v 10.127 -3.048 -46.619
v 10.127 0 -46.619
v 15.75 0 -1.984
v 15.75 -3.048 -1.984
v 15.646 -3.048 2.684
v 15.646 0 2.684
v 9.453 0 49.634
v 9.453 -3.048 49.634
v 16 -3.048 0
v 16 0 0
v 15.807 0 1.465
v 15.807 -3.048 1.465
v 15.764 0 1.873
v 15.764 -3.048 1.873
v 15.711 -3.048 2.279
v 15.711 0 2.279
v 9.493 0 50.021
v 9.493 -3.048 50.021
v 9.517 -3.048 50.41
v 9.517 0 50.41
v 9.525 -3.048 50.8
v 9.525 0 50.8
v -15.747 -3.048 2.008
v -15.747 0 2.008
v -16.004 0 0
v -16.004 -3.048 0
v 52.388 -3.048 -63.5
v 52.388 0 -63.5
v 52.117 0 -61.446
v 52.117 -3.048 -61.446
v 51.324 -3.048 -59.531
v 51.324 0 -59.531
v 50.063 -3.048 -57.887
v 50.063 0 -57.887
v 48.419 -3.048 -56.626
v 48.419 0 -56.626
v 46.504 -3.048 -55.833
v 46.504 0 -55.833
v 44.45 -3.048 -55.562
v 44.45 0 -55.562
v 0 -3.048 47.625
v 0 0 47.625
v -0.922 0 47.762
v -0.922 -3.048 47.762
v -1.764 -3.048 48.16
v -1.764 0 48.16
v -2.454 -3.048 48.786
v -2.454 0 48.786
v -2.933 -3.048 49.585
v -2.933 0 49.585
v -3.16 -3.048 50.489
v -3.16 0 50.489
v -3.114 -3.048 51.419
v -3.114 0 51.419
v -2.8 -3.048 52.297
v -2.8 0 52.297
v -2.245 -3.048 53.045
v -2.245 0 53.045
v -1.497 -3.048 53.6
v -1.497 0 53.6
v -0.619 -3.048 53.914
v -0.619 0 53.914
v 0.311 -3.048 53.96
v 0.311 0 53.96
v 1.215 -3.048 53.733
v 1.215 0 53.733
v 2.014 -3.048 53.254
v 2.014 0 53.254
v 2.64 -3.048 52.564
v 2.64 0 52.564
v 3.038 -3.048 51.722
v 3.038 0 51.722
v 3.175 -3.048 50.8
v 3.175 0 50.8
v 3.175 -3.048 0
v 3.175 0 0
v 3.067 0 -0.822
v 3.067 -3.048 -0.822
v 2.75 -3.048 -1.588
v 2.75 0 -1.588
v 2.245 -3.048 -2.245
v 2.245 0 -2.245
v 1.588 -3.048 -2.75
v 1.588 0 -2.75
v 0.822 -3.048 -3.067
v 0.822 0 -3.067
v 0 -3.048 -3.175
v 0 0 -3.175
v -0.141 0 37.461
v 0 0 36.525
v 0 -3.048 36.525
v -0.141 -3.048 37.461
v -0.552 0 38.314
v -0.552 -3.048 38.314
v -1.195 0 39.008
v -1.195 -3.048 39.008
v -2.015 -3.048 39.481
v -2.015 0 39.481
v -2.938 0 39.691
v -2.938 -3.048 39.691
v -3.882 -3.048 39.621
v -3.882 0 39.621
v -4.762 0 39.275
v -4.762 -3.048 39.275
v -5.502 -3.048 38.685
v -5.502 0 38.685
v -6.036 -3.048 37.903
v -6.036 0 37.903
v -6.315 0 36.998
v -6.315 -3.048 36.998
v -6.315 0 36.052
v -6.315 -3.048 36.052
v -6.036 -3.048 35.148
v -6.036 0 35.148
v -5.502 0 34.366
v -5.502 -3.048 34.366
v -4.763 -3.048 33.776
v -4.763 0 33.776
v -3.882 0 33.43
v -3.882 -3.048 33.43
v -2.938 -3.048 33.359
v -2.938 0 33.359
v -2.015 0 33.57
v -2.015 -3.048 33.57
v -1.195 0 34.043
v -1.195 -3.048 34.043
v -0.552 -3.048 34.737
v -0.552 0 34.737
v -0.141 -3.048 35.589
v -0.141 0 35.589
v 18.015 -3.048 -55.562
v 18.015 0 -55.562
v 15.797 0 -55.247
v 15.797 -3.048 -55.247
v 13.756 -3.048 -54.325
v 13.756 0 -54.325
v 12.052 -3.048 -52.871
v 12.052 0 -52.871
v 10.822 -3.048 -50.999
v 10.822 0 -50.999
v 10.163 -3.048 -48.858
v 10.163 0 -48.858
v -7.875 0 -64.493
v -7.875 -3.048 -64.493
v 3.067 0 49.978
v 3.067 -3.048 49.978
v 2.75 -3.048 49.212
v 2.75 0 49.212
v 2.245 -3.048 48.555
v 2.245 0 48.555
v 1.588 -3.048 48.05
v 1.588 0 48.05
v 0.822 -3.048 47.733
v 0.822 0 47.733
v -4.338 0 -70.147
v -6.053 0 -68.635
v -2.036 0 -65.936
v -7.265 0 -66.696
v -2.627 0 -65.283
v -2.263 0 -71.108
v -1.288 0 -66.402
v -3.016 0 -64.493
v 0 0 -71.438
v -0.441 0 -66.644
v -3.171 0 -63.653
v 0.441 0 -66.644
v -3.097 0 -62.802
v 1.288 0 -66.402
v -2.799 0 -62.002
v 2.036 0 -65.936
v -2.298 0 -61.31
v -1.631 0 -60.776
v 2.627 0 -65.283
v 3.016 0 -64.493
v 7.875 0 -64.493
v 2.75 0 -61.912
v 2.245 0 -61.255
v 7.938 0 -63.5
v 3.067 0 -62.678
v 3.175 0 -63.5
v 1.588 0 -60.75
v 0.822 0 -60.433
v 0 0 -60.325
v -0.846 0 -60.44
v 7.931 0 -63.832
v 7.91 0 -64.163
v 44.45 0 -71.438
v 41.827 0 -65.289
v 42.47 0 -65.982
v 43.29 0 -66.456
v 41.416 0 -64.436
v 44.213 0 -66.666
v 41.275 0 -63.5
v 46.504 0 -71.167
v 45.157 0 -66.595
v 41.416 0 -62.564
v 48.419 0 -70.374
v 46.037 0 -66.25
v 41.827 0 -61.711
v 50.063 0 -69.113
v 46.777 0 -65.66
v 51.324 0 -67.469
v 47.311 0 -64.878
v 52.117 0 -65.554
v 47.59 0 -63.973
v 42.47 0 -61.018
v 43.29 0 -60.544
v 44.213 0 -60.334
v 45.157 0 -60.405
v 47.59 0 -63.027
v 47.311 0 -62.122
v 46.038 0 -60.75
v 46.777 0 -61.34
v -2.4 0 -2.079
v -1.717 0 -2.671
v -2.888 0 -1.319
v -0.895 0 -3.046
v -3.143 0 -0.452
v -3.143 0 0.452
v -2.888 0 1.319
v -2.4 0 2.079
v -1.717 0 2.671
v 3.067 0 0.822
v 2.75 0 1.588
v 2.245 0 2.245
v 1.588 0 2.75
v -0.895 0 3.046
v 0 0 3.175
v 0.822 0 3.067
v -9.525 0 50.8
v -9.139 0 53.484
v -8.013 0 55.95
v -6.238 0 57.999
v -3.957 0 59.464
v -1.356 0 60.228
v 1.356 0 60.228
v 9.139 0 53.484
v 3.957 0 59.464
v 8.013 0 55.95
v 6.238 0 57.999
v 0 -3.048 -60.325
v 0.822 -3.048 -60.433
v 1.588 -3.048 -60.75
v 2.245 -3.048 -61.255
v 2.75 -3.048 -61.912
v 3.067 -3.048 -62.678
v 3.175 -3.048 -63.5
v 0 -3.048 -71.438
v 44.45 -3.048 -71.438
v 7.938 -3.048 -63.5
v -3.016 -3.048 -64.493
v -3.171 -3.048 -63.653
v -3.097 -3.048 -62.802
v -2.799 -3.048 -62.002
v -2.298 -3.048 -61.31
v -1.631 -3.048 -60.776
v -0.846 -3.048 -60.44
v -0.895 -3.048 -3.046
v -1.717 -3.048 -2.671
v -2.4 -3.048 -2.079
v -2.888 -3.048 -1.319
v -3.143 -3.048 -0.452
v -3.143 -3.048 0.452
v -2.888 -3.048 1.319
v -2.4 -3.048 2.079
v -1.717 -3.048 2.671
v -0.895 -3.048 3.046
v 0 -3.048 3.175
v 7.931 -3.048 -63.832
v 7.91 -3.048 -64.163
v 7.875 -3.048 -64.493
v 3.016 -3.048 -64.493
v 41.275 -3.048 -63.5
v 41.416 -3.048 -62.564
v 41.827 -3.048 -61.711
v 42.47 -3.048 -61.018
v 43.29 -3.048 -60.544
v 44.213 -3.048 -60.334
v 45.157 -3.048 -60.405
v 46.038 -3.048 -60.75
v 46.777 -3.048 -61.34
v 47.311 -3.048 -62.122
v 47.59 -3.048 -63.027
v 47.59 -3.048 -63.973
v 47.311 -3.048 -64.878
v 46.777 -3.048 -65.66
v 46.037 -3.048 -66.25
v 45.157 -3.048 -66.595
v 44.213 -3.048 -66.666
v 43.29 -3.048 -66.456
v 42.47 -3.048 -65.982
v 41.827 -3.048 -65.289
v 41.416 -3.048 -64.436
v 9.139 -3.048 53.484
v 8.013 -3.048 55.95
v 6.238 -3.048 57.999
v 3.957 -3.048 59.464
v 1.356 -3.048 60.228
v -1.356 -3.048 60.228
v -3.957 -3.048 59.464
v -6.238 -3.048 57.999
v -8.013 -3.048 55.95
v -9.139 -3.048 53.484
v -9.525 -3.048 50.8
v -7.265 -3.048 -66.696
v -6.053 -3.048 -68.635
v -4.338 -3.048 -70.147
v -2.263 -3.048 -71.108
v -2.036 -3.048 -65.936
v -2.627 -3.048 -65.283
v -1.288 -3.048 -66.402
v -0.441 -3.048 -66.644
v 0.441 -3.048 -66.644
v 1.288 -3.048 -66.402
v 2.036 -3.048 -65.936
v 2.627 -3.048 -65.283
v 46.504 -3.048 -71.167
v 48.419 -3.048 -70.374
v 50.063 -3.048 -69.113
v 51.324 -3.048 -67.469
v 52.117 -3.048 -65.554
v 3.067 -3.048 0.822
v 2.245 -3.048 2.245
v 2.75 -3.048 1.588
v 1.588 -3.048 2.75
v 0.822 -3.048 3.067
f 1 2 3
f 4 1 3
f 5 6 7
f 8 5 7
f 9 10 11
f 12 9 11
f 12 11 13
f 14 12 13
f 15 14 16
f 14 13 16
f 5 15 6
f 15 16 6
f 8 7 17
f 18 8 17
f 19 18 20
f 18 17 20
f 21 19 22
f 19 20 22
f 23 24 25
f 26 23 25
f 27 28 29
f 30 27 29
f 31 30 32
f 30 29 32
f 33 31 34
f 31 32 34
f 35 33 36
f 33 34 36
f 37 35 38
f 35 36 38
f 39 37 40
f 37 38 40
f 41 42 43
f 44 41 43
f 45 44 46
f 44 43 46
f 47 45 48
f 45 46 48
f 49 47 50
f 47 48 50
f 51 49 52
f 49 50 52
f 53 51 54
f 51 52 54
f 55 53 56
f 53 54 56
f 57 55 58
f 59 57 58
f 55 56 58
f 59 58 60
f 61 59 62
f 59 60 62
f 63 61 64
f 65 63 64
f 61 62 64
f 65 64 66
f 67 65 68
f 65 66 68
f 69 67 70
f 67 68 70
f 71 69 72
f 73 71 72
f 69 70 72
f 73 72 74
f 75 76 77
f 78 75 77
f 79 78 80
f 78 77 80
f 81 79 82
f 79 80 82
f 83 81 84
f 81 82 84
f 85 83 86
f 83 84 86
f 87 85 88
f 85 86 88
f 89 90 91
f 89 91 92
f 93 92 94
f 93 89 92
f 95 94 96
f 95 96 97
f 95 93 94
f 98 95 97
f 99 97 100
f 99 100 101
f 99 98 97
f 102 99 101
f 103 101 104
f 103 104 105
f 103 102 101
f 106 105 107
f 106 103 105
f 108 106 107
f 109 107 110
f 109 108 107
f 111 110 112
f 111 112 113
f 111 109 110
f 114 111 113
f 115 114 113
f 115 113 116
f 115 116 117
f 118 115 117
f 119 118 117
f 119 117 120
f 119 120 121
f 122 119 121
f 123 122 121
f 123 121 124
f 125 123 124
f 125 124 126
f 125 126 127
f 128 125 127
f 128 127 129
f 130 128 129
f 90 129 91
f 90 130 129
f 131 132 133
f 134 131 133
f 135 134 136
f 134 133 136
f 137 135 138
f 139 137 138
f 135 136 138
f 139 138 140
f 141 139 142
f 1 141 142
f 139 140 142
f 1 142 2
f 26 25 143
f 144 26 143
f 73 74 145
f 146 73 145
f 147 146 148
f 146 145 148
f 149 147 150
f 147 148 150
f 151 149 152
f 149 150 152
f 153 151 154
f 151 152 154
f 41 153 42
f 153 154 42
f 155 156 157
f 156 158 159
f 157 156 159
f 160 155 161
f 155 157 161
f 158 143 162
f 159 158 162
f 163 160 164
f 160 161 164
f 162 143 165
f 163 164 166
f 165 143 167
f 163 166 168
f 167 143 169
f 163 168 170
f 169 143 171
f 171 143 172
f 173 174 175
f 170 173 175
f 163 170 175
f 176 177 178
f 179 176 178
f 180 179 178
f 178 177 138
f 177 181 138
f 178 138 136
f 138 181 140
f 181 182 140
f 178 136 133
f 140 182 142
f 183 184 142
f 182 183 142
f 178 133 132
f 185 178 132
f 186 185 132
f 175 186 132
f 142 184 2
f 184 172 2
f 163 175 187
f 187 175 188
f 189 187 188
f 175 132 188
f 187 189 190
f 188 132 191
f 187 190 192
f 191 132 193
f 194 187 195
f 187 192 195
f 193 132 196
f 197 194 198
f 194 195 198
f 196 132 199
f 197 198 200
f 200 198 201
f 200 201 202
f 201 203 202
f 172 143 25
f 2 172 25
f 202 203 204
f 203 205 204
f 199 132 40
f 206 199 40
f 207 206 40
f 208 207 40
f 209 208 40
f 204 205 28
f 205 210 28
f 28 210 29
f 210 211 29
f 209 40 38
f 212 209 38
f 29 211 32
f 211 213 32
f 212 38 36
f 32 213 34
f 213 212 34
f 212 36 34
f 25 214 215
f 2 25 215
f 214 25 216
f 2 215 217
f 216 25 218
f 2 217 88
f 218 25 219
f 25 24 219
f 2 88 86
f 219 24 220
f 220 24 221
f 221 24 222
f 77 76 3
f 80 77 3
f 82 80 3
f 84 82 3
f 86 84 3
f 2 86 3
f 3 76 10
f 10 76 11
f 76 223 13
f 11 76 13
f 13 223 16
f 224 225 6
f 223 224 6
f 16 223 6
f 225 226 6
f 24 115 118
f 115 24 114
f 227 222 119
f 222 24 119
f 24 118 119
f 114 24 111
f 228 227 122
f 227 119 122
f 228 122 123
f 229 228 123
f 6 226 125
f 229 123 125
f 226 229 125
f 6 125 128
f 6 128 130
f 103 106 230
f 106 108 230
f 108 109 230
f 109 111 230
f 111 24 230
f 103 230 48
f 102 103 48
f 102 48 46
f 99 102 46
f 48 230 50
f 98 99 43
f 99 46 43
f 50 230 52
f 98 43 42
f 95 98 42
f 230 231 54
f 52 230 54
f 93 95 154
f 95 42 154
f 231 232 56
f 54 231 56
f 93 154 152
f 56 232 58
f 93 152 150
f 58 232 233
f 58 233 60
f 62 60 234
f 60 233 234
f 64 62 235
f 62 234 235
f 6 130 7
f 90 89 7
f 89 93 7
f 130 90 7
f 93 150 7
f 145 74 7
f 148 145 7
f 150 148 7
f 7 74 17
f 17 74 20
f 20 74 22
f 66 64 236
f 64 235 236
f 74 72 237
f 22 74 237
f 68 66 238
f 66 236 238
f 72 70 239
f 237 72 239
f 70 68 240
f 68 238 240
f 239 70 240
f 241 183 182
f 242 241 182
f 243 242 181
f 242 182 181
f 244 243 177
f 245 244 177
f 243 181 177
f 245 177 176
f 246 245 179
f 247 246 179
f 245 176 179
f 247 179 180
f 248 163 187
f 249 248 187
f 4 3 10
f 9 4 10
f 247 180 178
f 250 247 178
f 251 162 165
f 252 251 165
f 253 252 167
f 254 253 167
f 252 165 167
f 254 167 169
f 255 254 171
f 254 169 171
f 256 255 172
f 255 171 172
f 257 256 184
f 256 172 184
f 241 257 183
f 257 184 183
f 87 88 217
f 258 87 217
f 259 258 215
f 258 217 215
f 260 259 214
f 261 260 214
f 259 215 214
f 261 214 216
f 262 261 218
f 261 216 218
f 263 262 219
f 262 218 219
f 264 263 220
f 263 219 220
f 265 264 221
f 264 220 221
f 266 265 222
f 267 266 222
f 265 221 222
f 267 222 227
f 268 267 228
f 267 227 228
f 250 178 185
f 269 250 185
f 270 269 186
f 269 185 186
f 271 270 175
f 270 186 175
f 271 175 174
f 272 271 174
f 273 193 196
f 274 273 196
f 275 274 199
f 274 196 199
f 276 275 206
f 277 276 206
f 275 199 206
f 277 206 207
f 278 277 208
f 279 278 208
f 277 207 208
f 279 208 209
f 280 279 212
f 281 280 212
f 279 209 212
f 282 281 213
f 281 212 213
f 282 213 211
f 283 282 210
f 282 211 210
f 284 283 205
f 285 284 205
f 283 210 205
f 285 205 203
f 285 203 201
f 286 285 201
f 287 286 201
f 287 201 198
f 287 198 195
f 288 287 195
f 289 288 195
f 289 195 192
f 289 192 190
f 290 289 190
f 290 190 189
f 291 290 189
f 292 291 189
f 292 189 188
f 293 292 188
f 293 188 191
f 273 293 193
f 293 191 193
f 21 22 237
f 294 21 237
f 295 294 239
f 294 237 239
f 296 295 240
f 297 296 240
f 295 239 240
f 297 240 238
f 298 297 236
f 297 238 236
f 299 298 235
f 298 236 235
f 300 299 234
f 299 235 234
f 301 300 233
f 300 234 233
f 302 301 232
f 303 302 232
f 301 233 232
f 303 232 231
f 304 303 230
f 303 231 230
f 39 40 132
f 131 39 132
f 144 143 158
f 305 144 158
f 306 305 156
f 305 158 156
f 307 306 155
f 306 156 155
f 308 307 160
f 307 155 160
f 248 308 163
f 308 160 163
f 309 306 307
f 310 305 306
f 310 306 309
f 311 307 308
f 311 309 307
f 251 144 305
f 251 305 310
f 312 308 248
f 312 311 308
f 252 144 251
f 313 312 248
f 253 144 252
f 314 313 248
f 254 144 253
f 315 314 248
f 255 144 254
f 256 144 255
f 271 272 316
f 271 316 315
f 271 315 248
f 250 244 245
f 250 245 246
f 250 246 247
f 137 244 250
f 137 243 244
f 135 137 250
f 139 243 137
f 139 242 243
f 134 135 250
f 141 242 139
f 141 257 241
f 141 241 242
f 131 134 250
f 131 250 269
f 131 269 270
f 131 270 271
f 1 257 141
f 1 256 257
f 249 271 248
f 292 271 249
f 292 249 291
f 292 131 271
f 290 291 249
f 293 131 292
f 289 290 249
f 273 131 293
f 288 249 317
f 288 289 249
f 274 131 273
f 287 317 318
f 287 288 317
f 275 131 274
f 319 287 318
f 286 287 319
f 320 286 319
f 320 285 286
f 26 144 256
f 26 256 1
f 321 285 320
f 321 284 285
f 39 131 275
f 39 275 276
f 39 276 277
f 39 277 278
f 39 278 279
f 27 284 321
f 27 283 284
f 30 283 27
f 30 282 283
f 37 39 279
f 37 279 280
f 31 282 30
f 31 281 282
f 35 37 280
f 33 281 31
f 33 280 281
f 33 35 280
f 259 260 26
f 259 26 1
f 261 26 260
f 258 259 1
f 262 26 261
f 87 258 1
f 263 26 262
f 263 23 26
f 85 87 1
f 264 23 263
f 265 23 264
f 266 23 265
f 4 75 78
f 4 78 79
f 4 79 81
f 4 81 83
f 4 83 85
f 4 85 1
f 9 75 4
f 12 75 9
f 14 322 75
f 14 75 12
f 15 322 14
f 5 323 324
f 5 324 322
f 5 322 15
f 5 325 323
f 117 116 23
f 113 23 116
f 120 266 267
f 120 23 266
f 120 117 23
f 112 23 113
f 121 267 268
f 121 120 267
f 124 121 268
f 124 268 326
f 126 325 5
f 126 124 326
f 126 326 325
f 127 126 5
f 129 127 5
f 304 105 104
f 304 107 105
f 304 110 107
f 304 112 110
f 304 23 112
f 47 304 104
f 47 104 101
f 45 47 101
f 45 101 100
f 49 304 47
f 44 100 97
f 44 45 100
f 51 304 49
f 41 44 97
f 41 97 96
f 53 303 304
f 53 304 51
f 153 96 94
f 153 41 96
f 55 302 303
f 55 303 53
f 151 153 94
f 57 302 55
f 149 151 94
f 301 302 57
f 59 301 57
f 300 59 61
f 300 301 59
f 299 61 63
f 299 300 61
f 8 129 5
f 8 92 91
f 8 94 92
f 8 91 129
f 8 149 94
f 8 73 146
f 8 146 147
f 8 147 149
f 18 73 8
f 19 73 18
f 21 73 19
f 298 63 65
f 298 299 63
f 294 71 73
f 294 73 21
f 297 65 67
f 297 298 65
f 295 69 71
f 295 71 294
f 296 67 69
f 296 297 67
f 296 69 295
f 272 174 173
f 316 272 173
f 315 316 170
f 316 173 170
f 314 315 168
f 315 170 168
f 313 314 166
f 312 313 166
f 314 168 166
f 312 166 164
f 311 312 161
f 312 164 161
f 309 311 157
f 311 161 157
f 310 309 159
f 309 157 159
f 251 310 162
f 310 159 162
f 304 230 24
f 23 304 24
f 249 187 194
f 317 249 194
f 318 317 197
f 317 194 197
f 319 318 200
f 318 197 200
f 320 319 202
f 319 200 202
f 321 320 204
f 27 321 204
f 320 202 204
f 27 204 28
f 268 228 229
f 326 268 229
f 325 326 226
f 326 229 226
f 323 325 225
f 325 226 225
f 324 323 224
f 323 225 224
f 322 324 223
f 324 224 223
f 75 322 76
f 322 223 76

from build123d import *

# Parameters (mm, degrees)
F0_R     = 3.175
F1_DEPTH = 3.048


with BuildPart() as f1:
    # F0 (on Front) → F1 (new body)
    with BuildSketch(Plane.XZ):
        with BuildLine():
            ThreePointArc((-9.525, 50.8), (-6.7351920908, 44.0648079092), (0, 41.275))
            ThreePointArc((0, 41.275), (6.3093081085, 43.6642970779), (9.4533014816, 49.6335026369))
            ThreePointArc((9.4533014816, 49.6335026369), (9.5070584728, 50.2156506234), (9.525, 50.8))
            ThreePointArc((9.525, 50.8), (0, 60.325), (-9.525, 50.8))
        make_face()
        with BuildLine():
            ThreePointArc((3.175, 50.8), (2.2450640303, 48.5549359697), (0, 47.625))
            ThreePointArc((0, 47.625), (-2.2450640303, 53.0450640303), (3.175, 50.8))
        make_face(mode=Mode.SUBTRACT)
        with BuildLine():
            ThreePointArc((9.4533014816, 49.6335026369), (6.3093081085, 43.6642970779), (0, 41.275))
            Line((0, 41.275), (0, 36.5252))
            Line((0, 36.5252), (0, 15.875))
            ThreePointArc((0, 15.875), (10.2323349377, 12.1373368876), (15.646399532, 2.6843633667))
            Line((15.646399532, 2.6843633667), (9.4533014816, 49.6335026369))
        make_face()
        with BuildLine():
            Line((0, 36.5252), (0, 41.275))
            ThreePointArc((0, 41.275), (-6.7351920908, 44.0648079092), (-9.525, 50.8))
            Line((-9.525, 50.8), (-15.7474569171, 2.008289233))
            ThreePointArc((-15.7474569171, 2.008289233), (-10.4912828917, 11.9142187443), (0, 15.875))
            Line((0, 15.875), (0, 36.5252))
        make_face()
        with Locations((-3.175, 36.5252)):
            Circle(F0_R, mode=Mode.SUBTRACT)
        with BuildLine():
            ThreePointArc((15.646399532, 2.6843633667), (10.2323349377, 12.1373368876), (0, 15.875))
            Line((0, 15.875), (0, 3.175))
            ThreePointArc((0, 3.175), (2.2450640303, 2.2450640303), (3.175, 0))
            ThreePointArc((3.175, 0), (2.2450640303, -2.2450640303), (0, -3.175))
            Line((0, -3.175), (0, -15.875))
            ThreePointArc((0, -15.875), (10.5003255684, -11.9062499536), (15.7504882912, -1.9843748607))
            ThreePointArc((15.7504882912, -1.9843748607), (15.8438414948, -0.9941386666), (15.875, 0))
            ThreePointArc((15.875, 0), (15.8580619796, 0.7331406754), (15.807284063, 1.4647168844))
            Line((15.807284063, 1.4647168844), (15.646399532, 2.6843633667))
        make_face()
        with BuildLine():
            Line((0, 3.175), (0, 15.875))
            ThreePointArc((0, 15.875), (-10.4912828917, 11.9142187443), (-15.7474569171, 2.008289233))
            ThreePointArc((-15.7474569171, 2.008289233), (-11.9142187443, -10.4912828917), (0, -15.875))
            Line((0, -15.875), (0, -3.175))
            ThreePointArc((0, -3.175), (-3.175, 0), (0, 3.175))
        make_face()
        with BuildLine():
            ThreePointArc((0, -15.875), (-11.9142187443, -10.4912828917), (-15.7474569171, 2.008289233))
            Line((-15.7474569171, 2.008289233), (-16.0035761028, 0))
            Line((-16.0035761028, 0), (-7.8751974831, -64.4925577322))
            ThreePointArc((-7.8751974831, -64.4925577322), (-5.9532484095, -58.2499771786), (0, -55.5625))
            Line((0, -55.5625), (0, -15.875))
        make_face()
        with BuildLine():
            ThreePointArc((15.807284063, 1.4647168844), (15.7386605945, 2.0760991524), (15.646399532, 2.6843633667))
            Line((15.646399532, 2.6843633667), (15.807284063, 1.4647168844))
        make_face()
        with BuildLine():
            ThreePointArc((15.7504882912, -1.9843748607), (10.5003255684, -11.9062499536), (0, -15.875))
            Line((0, -15.875), (0, -55.5625))
            ThreePointArc((0, -55.5625), (5.6126600757, -57.8873399243), (7.9375, -63.5))
            Line((7.9375, -63.5), (36.5125, -63.5))
            ThreePointArc((36.5125, -63.5), (38.8373399243, -57.8873399243), (44.45, -55.5625))
            Line((44.45, -55.5625), (18.0149584672, -55.5625))
            ThreePointArc((18.0149584672, -55.5625), (12.0523084668, -52.8708630179), (10.1271139399, -46.6185249989))
            Line((10.1271139399, -46.6185249989), (15.7504882912, -1.9843748607))
        make_face()
        with BuildLine():
            Line((16.0004960243, 0), (15.807284063, 1.4647168844))
            ThreePointArc((15.807284063, 1.4647168844), (15.8580619796, 0.7331406754), (15.875, 0))
            ThreePointArc((15.875, 0), (15.8438414948, -0.9941386666), (15.7504882912, -1.9843748607))
            Line((15.7504882912, -1.9843748607), (16.0004960243, 0))
        make_face()
        with BuildLine():
            Line((0, -60.325), (0, -55.5625))
            ThreePointArc((0, -55.5625), (-5.9532484095, -58.2499771786), (-7.8751974831, -64.4925577322))
            Line((-7.8751974831, -64.4925577322), (-3.0158670641, -64.4925577322))
            ThreePointArc((-3.0158670641, -64.4925577322), (-2.5721582183, -61.6386491196), (0, -60.325))
        make_face()
        with BuildLine():
            Line((-3.0158670641, -64.4925577322), (-7.8751974831, -64.4925577322))
            ThreePointArc((-7.8751974831, -64.4925577322), (-5.2500228214, -69.4532484095), (0, -71.4375))
            ThreePointArc((0, -71.4375), (5.2500228214, -69.4532484095), (7.8751974831, -64.4925577322))
            Line((7.8751974831, -64.4925577322), (3.0158670641, -64.4925577322))
            ThreePointArc((3.0158670641, -64.4925577322), (0, -66.675), (-3.0158670641, -64.4925577322))
        make_face()
        with BuildLine():
            Line((36.5125, -63.5), (7.9375, -63.5))
            ThreePointArc((7.9375, -63.5), (7.9219090588, -63.997255582), (7.8751974831, -64.4925577322))
            ThreePointArc((7.8751974831, -64.4925577322), (5.2500228214, -69.4532484095), (0, -71.4375))
            Line((0, -71.4375), (44.45, -71.4375))
            ThreePointArc((44.45, -71.4375), (38.8373399243, -69.1126600757), (36.5125, -63.5))
        make_face()
        with BuildLine():
            ThreePointArc((44.45, -55.5625), (38.8373399243, -57.8873399243), (36.5125, -63.5))
            ThreePointArc((36.5125, -63.5), (38.8373399243, -69.1126600757), (44.45, -71.4375))
            ThreePointArc((44.45, -71.4375), (50.0626600757, -69.1126600757), (52.3875, -63.5))
            ThreePointArc((52.3875, -63.5), (50.0626600757, -57.8873399243), (44.45, -55.5625))
        make_face()
        with BuildLine():
            ThreePointArc((47.625, -63.5), (44.45, -66.675), (41.275, -63.5))
            ThreePointArc((41.275, -63.5), (44.45, -60.325), (47.625, -63.5))
        make_face(mode=Mode.SUBTRACT)
        with BuildLine():
            ThreePointArc((7.9375, -63.5), (5.6126600757, -57.8873399243), (0, -55.5625))
            Line((0, -55.5625), (0, -60.325))
            ThreePointArc((0, -60.325), (2.2450640303, -61.2549359697), (3.175, -63.5))
            Line((3.175, -63.5), (7.9375, -63.5))
        make_face()
    extrude(amount=F1_DEPTH)


solid = f1.part
